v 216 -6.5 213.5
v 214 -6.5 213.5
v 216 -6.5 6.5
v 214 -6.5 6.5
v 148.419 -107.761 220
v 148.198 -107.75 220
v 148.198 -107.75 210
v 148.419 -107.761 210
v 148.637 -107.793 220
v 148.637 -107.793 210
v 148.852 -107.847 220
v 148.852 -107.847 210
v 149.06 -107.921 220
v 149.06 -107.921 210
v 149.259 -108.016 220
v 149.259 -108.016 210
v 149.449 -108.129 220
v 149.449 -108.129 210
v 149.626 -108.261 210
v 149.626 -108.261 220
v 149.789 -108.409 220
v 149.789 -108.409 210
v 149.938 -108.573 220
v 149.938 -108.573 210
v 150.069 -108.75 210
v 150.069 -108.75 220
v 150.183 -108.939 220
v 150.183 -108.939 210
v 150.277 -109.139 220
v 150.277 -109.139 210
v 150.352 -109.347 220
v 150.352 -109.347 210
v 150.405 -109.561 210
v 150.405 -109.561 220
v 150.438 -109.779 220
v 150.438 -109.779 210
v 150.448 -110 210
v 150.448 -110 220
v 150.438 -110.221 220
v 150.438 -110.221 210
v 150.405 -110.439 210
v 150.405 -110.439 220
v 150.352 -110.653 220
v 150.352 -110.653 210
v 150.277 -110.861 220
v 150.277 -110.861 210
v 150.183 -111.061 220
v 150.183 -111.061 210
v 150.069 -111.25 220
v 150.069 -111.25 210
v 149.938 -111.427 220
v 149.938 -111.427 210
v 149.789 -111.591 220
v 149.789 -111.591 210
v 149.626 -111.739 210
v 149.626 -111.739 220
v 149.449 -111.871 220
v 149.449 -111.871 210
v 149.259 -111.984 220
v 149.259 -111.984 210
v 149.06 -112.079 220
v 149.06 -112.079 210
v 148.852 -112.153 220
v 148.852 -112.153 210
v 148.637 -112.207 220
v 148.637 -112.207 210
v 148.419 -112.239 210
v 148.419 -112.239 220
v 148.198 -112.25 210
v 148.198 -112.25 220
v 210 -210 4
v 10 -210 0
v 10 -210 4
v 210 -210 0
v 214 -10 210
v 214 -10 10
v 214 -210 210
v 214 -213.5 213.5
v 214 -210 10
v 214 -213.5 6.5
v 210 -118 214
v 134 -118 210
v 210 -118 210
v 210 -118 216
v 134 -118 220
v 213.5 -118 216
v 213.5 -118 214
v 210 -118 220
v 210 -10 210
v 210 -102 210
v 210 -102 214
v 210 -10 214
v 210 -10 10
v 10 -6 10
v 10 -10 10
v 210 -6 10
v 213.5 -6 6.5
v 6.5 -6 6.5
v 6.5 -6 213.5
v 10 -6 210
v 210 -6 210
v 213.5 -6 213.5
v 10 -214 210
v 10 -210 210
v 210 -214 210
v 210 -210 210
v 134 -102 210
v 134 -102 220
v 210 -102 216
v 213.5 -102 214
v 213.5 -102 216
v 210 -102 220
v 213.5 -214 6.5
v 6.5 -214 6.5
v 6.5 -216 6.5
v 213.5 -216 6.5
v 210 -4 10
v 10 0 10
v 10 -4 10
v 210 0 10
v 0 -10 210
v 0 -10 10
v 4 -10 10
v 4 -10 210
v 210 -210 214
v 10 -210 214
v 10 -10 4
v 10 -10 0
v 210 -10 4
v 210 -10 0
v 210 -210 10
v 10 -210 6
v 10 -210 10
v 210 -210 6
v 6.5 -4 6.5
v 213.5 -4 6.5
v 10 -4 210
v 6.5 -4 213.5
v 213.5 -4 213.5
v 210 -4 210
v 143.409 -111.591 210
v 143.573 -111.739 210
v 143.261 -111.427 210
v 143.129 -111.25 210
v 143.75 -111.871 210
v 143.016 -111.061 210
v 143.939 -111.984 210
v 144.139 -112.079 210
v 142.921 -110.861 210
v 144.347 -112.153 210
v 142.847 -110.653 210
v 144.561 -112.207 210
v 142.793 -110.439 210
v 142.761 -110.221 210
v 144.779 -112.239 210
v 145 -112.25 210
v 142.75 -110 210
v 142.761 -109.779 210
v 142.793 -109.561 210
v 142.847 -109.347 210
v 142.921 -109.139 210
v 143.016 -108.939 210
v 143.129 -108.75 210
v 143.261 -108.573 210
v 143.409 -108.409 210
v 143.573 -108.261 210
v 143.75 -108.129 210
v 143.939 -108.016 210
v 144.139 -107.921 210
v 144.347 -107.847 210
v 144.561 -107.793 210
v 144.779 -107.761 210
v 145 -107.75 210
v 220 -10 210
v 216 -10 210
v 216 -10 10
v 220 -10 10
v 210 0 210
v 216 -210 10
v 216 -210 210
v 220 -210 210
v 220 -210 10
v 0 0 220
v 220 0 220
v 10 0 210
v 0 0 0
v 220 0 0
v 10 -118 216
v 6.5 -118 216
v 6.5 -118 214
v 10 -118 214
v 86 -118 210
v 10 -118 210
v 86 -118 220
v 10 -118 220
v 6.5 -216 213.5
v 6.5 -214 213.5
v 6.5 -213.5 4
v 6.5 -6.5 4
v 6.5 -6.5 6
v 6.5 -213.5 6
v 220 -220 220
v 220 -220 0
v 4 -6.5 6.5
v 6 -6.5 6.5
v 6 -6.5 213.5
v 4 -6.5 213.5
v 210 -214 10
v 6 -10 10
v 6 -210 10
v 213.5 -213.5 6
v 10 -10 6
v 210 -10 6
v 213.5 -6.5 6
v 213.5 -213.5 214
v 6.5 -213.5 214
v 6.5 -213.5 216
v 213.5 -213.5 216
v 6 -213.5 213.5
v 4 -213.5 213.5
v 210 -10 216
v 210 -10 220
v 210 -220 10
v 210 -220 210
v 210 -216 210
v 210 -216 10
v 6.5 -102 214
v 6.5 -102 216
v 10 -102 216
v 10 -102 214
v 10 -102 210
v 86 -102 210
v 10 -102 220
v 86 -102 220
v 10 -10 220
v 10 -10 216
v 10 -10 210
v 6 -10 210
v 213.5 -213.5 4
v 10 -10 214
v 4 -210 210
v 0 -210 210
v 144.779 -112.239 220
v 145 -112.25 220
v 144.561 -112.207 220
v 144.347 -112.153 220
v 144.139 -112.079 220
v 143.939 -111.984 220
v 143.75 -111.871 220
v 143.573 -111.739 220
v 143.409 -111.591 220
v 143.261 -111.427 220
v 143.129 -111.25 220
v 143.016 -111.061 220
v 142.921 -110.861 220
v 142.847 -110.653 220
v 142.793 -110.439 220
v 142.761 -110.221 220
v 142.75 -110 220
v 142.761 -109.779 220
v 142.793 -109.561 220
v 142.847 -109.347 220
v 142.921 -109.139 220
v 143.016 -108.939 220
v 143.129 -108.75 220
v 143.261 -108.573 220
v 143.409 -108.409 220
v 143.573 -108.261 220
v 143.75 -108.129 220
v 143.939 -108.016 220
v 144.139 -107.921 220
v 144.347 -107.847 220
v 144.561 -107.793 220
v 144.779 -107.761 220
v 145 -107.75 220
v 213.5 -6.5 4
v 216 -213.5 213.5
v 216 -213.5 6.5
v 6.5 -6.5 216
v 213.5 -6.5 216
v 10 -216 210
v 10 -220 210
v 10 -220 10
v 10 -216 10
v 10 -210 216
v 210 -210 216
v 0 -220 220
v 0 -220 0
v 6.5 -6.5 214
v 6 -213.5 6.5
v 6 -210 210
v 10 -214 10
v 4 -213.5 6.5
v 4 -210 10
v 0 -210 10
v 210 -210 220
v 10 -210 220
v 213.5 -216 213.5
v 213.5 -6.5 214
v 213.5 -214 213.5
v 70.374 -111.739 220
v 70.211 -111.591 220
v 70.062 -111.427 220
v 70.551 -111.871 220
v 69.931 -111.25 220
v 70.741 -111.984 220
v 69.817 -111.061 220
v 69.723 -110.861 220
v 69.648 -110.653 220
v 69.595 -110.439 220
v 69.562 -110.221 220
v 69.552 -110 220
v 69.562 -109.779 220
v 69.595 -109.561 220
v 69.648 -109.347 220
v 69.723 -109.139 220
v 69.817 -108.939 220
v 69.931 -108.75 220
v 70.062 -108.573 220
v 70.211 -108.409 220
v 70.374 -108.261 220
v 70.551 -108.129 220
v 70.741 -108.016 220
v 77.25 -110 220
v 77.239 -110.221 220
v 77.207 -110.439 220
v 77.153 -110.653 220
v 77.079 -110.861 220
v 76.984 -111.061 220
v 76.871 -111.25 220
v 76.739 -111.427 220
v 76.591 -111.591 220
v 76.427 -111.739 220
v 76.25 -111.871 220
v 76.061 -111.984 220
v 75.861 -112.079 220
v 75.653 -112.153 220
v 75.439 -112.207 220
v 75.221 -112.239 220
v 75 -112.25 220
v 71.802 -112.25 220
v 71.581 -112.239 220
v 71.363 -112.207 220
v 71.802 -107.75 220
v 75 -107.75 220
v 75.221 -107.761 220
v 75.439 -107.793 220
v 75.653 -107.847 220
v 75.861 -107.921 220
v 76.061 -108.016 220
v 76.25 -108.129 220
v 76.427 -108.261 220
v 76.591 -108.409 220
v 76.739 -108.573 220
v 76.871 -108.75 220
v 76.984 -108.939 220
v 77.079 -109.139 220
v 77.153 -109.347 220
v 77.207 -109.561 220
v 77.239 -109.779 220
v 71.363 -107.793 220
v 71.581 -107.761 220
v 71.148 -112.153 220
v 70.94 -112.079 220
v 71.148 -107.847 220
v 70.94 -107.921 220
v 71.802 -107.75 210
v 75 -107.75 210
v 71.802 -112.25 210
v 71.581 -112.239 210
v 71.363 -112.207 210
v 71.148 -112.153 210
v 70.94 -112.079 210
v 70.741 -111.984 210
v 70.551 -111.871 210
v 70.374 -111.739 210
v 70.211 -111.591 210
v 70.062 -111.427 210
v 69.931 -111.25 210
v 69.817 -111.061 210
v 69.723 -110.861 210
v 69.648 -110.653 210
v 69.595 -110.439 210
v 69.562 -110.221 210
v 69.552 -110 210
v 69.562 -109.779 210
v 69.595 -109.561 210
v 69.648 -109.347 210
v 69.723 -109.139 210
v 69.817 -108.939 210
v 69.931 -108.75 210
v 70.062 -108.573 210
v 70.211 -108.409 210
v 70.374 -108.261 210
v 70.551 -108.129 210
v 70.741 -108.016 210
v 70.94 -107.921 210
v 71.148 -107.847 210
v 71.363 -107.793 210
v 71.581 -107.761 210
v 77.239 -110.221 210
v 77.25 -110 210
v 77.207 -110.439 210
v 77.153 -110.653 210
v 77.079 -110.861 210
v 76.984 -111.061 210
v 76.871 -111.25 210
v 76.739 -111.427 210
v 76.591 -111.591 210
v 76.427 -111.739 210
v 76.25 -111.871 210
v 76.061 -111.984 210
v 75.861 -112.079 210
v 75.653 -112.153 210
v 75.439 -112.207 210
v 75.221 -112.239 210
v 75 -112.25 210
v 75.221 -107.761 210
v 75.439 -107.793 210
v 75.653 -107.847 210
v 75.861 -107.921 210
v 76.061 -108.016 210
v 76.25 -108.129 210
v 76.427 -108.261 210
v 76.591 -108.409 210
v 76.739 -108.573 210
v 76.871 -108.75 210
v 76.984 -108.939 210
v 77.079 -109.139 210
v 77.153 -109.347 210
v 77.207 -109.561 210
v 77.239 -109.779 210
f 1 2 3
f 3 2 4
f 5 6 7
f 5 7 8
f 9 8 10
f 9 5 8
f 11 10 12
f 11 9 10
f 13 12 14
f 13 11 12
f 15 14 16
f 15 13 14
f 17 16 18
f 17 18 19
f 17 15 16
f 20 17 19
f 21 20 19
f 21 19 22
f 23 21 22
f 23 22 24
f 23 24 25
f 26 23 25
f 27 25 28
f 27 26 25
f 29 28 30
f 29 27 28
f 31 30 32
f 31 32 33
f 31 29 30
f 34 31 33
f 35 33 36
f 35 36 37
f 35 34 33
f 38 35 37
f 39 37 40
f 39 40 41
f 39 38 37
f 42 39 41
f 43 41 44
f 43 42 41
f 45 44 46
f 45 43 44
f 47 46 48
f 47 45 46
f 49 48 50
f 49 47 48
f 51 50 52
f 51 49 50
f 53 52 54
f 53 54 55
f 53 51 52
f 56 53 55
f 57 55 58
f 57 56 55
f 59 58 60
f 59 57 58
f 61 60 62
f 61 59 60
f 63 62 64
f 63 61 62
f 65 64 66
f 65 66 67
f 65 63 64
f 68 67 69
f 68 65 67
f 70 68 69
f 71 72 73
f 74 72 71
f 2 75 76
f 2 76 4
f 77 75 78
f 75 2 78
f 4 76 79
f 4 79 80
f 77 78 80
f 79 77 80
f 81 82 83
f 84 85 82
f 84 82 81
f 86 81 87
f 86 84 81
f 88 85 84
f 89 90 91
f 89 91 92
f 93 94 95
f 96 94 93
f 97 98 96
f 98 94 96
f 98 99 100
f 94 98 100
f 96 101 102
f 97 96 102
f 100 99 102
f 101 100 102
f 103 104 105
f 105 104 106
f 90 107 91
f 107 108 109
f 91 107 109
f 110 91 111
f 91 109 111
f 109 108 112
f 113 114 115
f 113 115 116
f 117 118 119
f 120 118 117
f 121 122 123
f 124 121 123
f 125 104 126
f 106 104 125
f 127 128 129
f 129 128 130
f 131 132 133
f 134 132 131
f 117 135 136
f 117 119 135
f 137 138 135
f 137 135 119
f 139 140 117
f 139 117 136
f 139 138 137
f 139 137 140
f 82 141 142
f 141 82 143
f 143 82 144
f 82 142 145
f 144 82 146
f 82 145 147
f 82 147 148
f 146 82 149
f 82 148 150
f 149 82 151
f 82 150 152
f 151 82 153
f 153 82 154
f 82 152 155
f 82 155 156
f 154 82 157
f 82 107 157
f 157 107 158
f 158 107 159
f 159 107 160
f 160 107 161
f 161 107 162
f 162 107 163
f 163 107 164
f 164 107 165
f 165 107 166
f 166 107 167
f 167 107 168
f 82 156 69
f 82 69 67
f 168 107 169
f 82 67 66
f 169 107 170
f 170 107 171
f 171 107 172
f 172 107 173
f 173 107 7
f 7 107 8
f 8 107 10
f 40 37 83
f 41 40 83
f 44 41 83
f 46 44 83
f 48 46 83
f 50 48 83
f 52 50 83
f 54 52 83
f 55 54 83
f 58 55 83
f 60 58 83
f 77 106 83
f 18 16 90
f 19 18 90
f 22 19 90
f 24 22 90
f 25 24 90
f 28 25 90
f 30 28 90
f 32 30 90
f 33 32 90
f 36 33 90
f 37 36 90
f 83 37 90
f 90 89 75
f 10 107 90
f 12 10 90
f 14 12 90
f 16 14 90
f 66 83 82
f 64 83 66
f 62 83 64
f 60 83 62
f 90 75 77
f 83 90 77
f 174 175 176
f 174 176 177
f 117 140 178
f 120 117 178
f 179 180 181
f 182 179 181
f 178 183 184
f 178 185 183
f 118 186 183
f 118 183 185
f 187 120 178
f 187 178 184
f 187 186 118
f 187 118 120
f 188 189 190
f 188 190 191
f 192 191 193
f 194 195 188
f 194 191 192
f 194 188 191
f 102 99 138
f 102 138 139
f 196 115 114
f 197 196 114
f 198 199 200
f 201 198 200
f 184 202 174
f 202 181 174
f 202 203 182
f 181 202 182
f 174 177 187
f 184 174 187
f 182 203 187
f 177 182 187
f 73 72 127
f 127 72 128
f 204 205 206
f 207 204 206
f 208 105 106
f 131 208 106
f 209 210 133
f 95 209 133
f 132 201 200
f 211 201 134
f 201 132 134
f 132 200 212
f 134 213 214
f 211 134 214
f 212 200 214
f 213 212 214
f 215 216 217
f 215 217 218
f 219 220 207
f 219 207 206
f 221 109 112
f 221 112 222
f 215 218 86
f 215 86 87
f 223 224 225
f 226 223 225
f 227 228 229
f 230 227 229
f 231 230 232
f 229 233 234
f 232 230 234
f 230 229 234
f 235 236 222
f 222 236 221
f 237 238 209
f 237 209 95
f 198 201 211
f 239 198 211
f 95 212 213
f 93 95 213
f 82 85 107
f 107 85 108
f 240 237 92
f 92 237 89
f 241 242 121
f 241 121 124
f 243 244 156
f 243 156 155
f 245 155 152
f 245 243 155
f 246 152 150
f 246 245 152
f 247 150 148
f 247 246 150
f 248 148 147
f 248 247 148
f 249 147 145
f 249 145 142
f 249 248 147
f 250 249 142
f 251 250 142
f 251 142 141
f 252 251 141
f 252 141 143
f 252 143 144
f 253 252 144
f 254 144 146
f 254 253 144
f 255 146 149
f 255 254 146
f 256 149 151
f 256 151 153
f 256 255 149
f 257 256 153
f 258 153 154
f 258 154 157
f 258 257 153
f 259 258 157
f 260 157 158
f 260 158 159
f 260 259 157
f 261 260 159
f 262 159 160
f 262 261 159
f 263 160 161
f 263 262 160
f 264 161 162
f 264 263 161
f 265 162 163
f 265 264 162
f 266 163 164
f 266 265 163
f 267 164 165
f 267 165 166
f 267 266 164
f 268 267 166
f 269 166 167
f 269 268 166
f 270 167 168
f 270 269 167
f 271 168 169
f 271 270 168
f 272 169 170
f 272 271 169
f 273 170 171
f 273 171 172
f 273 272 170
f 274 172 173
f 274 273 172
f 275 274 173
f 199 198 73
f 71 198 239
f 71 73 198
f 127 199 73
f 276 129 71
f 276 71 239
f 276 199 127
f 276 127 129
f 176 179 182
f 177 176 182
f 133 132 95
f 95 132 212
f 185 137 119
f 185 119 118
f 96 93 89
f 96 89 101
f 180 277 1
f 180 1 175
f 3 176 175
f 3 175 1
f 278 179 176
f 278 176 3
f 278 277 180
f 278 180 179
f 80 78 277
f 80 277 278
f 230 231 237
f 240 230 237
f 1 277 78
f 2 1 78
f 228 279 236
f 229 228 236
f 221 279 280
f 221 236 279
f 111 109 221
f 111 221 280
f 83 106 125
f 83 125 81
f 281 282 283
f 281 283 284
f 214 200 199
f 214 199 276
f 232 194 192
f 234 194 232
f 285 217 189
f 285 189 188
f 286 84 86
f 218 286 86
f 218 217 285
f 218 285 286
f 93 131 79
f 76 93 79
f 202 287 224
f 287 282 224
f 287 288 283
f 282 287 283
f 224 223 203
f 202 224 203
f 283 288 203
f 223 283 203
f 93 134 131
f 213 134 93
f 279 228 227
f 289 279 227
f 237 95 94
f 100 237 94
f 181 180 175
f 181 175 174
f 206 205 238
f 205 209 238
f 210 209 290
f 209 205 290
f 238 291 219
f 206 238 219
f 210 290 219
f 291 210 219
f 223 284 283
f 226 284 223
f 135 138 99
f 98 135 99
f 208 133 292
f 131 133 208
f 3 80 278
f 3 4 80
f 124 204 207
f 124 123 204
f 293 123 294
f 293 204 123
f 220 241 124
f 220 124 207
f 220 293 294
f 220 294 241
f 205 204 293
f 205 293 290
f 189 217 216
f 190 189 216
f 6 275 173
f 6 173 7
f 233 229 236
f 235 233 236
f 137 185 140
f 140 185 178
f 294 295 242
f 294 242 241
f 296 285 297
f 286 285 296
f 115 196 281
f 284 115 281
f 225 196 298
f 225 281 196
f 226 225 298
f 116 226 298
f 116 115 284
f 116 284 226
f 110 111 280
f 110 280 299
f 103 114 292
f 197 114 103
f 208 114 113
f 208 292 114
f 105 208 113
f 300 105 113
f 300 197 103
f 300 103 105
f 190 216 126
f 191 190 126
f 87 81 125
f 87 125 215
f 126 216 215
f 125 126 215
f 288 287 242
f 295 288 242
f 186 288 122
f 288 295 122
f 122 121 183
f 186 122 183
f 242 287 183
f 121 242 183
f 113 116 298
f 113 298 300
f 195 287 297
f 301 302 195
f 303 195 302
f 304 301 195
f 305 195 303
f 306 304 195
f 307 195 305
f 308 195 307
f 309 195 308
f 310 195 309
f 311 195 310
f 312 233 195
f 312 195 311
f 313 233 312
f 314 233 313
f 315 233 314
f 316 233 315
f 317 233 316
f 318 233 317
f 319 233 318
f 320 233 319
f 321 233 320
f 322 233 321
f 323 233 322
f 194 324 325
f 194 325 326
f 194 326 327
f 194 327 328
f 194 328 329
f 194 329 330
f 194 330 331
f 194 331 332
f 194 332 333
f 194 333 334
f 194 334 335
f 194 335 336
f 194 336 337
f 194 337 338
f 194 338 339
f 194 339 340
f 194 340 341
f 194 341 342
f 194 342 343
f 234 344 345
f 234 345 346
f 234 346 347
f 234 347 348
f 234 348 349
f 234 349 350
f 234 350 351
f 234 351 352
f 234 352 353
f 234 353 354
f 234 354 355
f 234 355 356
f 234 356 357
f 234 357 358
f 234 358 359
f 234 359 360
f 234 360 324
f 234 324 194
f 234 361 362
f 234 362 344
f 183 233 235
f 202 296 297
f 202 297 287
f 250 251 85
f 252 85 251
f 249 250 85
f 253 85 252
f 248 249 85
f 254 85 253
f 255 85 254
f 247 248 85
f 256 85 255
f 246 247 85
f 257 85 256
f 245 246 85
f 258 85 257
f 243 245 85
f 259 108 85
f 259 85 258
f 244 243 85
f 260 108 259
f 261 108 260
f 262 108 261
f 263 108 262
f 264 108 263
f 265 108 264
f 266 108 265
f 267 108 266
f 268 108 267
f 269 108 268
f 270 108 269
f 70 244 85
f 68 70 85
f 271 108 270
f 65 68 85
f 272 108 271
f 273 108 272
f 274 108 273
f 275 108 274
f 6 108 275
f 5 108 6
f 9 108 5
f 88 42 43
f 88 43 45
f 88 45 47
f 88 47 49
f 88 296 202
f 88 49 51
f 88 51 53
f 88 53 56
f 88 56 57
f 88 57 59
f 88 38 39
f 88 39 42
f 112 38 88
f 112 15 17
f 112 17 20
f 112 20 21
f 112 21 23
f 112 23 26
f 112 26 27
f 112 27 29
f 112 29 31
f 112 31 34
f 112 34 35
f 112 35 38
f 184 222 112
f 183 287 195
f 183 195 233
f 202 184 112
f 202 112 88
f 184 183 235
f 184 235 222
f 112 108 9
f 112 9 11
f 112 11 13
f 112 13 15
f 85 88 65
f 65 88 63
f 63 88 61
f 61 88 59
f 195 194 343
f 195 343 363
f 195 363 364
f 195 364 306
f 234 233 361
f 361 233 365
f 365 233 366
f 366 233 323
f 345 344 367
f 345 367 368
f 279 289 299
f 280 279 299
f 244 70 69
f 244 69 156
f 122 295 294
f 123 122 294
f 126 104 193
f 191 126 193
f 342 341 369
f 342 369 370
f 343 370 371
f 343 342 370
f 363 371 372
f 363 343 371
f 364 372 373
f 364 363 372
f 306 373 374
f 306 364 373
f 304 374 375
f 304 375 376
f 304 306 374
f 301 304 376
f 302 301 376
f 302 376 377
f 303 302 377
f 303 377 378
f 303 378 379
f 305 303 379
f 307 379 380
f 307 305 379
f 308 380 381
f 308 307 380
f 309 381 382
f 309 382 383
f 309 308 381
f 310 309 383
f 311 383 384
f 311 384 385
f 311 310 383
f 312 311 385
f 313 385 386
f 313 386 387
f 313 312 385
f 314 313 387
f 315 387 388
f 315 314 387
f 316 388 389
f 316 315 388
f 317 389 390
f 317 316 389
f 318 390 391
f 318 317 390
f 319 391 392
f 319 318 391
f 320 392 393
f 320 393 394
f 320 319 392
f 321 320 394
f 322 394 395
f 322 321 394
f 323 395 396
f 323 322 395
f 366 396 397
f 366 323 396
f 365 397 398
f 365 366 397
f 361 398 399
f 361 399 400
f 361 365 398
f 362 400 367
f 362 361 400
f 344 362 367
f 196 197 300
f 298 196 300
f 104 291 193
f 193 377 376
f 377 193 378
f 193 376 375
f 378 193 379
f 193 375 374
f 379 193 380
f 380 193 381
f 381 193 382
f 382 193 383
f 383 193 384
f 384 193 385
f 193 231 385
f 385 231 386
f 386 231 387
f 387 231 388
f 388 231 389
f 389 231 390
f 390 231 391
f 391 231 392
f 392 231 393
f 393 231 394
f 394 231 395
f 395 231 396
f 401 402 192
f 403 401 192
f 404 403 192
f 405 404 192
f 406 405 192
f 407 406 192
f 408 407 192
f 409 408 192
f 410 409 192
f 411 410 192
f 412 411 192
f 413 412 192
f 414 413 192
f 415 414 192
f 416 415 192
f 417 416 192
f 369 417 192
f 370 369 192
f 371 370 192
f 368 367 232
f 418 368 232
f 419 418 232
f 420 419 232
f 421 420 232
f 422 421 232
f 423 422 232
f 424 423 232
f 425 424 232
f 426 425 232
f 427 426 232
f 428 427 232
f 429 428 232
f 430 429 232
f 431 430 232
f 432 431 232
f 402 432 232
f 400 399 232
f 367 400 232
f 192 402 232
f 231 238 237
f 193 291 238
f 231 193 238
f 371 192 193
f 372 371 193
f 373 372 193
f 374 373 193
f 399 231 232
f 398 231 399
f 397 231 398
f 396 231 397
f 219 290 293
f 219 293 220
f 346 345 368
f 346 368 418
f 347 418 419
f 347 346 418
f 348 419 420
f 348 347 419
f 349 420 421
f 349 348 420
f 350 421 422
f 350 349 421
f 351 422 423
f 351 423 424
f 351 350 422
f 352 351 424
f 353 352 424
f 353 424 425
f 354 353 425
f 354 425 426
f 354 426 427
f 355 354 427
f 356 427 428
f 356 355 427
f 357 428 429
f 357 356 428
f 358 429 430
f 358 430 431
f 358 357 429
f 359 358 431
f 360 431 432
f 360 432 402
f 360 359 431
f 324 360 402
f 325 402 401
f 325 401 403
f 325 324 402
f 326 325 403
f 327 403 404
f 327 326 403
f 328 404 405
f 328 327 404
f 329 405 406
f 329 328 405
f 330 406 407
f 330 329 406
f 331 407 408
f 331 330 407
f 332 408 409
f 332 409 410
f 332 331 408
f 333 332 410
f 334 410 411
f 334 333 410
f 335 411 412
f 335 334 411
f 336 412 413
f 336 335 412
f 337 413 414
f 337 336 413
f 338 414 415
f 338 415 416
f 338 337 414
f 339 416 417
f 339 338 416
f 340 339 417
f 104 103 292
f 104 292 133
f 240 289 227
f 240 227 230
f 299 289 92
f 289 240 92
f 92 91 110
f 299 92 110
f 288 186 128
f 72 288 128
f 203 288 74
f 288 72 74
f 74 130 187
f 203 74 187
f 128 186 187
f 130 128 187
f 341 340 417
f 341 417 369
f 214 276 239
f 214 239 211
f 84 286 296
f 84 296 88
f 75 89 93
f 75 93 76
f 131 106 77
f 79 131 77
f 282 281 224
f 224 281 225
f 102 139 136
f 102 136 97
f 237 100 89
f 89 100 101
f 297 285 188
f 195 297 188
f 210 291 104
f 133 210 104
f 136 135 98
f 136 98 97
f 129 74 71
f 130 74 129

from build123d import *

# Parameters (mm, degrees)
CROQUIS2_W                   = 220
CROQUIS2_H                   = 220
CROQUIS2_W_2                 = 200
CROQUIS2_H_2                 = 200
SALIENTE_EXTRUIR1_DEPTH      = 10
CROQUIS3_W                   = 212
CROQUIS3_H                   = 212
CROQUIS3_W_2                 = 210
CROQUIS3_H_2                 = 210
CROQUIS3_W_3                 = 208
CROQUIS3_H_3                 = 208
CORTAR_EXTRUIR1_DEPTH        = 3.5
CROQUIS4_W                   = 10
CROQUIS4_H                   = 10
SALIENTE_EXTRUIR2_DEPTH      = 200
SALIENTE_EXTRUIR2_DEPTH_BACK = 10
CROQUIS6_W                   = 3.5
CROQUIS6_H                   = 2
CROQUIS6_W_2                 = 2
CROQUIS6_H_2                 = 3.5
CROQUIS6_W_3                 = 1.99805467
CORTAR_EXTRUIR2_DEPTH        = 203.5
CROQUIS7_W                   = 220
CROQUIS7_H                   = 220
CROQUIS7_W_2                 = 200
CROQUIS7_H_2                 = 200
SALIENTE_EXTRUIR3_DEPTH      = 10
CORTAR_EXTRUIR3_START        = -3.5
CROQUIS8_W                   = 207
CROQUIS8_H                   = 2
CORTAR_EXTRUIR3_DEPTH        = 207
MATRIZC1_COUNT               = 4
CROQUIS9_W                   = 86
CROQUIS9_H                   = 16
BRAZOS_DEPTH                 = 10
MATRIZC2_COUNT               = 4


with BuildPart() as part:
    # Croquis2 → Saliente-Extruir1 (new body)
    with BuildSketch(Plane.XY):
        with Locations((110, -110)):
            Rectangle(CROQUIS2_W, CROQUIS2_H)
        with Locations((110, -110)):
            Rectangle(CROQUIS2_W_2, CROQUIS2_H_2, mode=Mode.SUBTRACT)
    extrude(amount=SALIENTE_EXTRUIR1_DEPTH)

    # Croquis3 → Cortar-Extruir1 (cut)
    with BuildSketch(Plane.XY.offset(10)):
        with Locations((110, -110)):
            Rectangle(CROQUIS3_W, CROQUIS3_H)
        with Locations((110, -110)):
            Rectangle(CROQUIS3_W_2, CROQUIS3_H_2, mode=Mode.SUBTRACT)
        with Locations((110, -110)):
            Rectangle(CROQUIS3_W_2, CROQUIS3_H_2)
        with Locations((110, -110)):
            Rectangle(CROQUIS3_W_3, CROQUIS3_H_3, mode=Mode.SUBTRACT)
    extrude(amount=-CORTAR_EXTRUIR1_DEPTH, mode=Mode.SUBTRACT)

    # Croquis4 → Saliente-Extruir2 (add, two sides)
    with BuildSketch(Plane.XY.offset(10)) as saliente_extruir2_sk:
        with Locations((5, -5)):
            Rectangle(CROQUIS4_W, CROQUIS4_H)
        with Locations((215, -5)):
            Rectangle(CROQUIS4_W, CROQUIS4_H)
        with Locations((215, -215)):
            Rectangle(CROQUIS4_W, CROQUIS4_H)
        with Locations((5, -215)):
            Rectangle(CROQUIS4_W, CROQUIS4_H)
    extrude(amount=SALIENTE_EXTRUIR2_DEPTH)
    extrude(saliente_extruir2_sk.sketch, amount=-SALIENTE_EXTRUIR2_DEPTH_BACK)

    # Croquis6 → Cortar-Extruir2 (cut)
    with BuildSketch(Plane.XY.offset(210)):
        with Locations((8.25, -5)):
            Rectangle(CROQUIS6_W, CROQUIS6_H)
        with Locations((5, -8.25)):
            Rectangle(CROQUIS6_W_2, CROQUIS6_H_2)
        with Locations((211.75, -5)):
            Rectangle(CROQUIS6_W, CROQUIS6_H)
        with Locations((215, -8.25)):
            Rectangle(CROQUIS6_W_2, CROQUIS6_H_2)
        with Locations((211.75, -215)):
            Rectangle(CROQUIS6_W, CROQUIS6_H)
        with Locations((215.000972665, -211.75)):
            Rectangle(CROQUIS6_W_3, CROQUIS6_H_2)
        with Locations((5, -211.75)):
            Rectangle(CROQUIS6_W_2, CROQUIS6_H_2)
        with Locations((8.25, -215)):
            Rectangle(CROQUIS6_W, CROQUIS6_H)
    extrude(amount=-CORTAR_EXTRUIR2_DEPTH, mode=Mode.SUBTRACT)

    # Croquis7 → Saliente-Extruir3 (add)
    with BuildSketch(Plane.XY.offset(210)):
        with Locations((110, -110)):
            Rectangle(CROQUIS7_W, CROQUIS7_H)
        with Locations((110, -110)):
            Rectangle(CROQUIS7_W_2, CROQUIS7_H_2, mode=Mode.SUBTRACT)
    extrude(amount=SALIENTE_EXTRUIR3_DEPTH)

    # Croquis8 → Cortar-Extruir3 (cut)
    with BuildSketch(Plane(origin=(0, -210, 0), x_dir=(1, 0, 0), z_dir=(0, 1, 0)).offset(CORTAR_EXTRUIR3_START)):
        with Locations((110, -215)):
            Rectangle(CROQUIS8_W, CROQUIS8_H)
    cortar_extruir3 = extrude(amount=CORTAR_EXTRUIR3_DEPTH, mode=Mode.SUBTRACT)

    # MatrizC1: Cortar-Extruir3 ×4 about axis
    matrizc1_axis = Axis((0, -110, 110), (1, 0, 0))
    for i in range(1, MATRIZC1_COUNT):
        add(cortar_extruir3.rotate(matrizc1_axis, i * 360 / MATRIZC1_COUNT), mode=Mode.SUBTRACT)

    # Croquis9 → Brazos (add)
    with BuildSketch(Plane.XY.offset(220)):
        with Locations((43, -110)):
            Rectangle(CROQUIS9_W, CROQUIS9_H)
        with BuildLine():
            ThreePointArc((71.801526277, -112.25), (69.551526277, -110), (71.801526277, -107.75))
            Line((71.801526277, -107.75), (75, -107.75))
            ThreePointArc((75, -107.75), (77.25, -110), (75, -112.25))
            Line((75, -112.25), (71.801526277, -112.25))
        make_face(mode=Mode.SUBTRACT)
        with Locations((177, -110)):
            Rectangle(CROQUIS9_W, CROQUIS9_H)
        with BuildLine():
            Line((145, -107.75), (148.198473723, -107.75))
            ThreePointArc((148.198473723, -107.75), (150.448473723, -110), (148.198473723, -112.25))
            Line((148.198473723, -112.25), (145, -112.25))
            ThreePointArc((145, -112.25), (142.75, -110), (145, -107.75))
        make_face(mode=Mode.SUBTRACT)
    extrude(amount=-BRAZOS_DEPTH)

    # MatrizC2: Cortar-Extruir3 ×4 about axis
    matrizc2_axis = Axis((110, 11, 110), (0, -1, 0))
    for i in range(1, MATRIZC2_COUNT):
        add(cortar_extruir3.rotate(matrizc2_axis, i * 360 / MATRIZC2_COUNT), mode=Mode.SUBTRACT)


solid = part.part
